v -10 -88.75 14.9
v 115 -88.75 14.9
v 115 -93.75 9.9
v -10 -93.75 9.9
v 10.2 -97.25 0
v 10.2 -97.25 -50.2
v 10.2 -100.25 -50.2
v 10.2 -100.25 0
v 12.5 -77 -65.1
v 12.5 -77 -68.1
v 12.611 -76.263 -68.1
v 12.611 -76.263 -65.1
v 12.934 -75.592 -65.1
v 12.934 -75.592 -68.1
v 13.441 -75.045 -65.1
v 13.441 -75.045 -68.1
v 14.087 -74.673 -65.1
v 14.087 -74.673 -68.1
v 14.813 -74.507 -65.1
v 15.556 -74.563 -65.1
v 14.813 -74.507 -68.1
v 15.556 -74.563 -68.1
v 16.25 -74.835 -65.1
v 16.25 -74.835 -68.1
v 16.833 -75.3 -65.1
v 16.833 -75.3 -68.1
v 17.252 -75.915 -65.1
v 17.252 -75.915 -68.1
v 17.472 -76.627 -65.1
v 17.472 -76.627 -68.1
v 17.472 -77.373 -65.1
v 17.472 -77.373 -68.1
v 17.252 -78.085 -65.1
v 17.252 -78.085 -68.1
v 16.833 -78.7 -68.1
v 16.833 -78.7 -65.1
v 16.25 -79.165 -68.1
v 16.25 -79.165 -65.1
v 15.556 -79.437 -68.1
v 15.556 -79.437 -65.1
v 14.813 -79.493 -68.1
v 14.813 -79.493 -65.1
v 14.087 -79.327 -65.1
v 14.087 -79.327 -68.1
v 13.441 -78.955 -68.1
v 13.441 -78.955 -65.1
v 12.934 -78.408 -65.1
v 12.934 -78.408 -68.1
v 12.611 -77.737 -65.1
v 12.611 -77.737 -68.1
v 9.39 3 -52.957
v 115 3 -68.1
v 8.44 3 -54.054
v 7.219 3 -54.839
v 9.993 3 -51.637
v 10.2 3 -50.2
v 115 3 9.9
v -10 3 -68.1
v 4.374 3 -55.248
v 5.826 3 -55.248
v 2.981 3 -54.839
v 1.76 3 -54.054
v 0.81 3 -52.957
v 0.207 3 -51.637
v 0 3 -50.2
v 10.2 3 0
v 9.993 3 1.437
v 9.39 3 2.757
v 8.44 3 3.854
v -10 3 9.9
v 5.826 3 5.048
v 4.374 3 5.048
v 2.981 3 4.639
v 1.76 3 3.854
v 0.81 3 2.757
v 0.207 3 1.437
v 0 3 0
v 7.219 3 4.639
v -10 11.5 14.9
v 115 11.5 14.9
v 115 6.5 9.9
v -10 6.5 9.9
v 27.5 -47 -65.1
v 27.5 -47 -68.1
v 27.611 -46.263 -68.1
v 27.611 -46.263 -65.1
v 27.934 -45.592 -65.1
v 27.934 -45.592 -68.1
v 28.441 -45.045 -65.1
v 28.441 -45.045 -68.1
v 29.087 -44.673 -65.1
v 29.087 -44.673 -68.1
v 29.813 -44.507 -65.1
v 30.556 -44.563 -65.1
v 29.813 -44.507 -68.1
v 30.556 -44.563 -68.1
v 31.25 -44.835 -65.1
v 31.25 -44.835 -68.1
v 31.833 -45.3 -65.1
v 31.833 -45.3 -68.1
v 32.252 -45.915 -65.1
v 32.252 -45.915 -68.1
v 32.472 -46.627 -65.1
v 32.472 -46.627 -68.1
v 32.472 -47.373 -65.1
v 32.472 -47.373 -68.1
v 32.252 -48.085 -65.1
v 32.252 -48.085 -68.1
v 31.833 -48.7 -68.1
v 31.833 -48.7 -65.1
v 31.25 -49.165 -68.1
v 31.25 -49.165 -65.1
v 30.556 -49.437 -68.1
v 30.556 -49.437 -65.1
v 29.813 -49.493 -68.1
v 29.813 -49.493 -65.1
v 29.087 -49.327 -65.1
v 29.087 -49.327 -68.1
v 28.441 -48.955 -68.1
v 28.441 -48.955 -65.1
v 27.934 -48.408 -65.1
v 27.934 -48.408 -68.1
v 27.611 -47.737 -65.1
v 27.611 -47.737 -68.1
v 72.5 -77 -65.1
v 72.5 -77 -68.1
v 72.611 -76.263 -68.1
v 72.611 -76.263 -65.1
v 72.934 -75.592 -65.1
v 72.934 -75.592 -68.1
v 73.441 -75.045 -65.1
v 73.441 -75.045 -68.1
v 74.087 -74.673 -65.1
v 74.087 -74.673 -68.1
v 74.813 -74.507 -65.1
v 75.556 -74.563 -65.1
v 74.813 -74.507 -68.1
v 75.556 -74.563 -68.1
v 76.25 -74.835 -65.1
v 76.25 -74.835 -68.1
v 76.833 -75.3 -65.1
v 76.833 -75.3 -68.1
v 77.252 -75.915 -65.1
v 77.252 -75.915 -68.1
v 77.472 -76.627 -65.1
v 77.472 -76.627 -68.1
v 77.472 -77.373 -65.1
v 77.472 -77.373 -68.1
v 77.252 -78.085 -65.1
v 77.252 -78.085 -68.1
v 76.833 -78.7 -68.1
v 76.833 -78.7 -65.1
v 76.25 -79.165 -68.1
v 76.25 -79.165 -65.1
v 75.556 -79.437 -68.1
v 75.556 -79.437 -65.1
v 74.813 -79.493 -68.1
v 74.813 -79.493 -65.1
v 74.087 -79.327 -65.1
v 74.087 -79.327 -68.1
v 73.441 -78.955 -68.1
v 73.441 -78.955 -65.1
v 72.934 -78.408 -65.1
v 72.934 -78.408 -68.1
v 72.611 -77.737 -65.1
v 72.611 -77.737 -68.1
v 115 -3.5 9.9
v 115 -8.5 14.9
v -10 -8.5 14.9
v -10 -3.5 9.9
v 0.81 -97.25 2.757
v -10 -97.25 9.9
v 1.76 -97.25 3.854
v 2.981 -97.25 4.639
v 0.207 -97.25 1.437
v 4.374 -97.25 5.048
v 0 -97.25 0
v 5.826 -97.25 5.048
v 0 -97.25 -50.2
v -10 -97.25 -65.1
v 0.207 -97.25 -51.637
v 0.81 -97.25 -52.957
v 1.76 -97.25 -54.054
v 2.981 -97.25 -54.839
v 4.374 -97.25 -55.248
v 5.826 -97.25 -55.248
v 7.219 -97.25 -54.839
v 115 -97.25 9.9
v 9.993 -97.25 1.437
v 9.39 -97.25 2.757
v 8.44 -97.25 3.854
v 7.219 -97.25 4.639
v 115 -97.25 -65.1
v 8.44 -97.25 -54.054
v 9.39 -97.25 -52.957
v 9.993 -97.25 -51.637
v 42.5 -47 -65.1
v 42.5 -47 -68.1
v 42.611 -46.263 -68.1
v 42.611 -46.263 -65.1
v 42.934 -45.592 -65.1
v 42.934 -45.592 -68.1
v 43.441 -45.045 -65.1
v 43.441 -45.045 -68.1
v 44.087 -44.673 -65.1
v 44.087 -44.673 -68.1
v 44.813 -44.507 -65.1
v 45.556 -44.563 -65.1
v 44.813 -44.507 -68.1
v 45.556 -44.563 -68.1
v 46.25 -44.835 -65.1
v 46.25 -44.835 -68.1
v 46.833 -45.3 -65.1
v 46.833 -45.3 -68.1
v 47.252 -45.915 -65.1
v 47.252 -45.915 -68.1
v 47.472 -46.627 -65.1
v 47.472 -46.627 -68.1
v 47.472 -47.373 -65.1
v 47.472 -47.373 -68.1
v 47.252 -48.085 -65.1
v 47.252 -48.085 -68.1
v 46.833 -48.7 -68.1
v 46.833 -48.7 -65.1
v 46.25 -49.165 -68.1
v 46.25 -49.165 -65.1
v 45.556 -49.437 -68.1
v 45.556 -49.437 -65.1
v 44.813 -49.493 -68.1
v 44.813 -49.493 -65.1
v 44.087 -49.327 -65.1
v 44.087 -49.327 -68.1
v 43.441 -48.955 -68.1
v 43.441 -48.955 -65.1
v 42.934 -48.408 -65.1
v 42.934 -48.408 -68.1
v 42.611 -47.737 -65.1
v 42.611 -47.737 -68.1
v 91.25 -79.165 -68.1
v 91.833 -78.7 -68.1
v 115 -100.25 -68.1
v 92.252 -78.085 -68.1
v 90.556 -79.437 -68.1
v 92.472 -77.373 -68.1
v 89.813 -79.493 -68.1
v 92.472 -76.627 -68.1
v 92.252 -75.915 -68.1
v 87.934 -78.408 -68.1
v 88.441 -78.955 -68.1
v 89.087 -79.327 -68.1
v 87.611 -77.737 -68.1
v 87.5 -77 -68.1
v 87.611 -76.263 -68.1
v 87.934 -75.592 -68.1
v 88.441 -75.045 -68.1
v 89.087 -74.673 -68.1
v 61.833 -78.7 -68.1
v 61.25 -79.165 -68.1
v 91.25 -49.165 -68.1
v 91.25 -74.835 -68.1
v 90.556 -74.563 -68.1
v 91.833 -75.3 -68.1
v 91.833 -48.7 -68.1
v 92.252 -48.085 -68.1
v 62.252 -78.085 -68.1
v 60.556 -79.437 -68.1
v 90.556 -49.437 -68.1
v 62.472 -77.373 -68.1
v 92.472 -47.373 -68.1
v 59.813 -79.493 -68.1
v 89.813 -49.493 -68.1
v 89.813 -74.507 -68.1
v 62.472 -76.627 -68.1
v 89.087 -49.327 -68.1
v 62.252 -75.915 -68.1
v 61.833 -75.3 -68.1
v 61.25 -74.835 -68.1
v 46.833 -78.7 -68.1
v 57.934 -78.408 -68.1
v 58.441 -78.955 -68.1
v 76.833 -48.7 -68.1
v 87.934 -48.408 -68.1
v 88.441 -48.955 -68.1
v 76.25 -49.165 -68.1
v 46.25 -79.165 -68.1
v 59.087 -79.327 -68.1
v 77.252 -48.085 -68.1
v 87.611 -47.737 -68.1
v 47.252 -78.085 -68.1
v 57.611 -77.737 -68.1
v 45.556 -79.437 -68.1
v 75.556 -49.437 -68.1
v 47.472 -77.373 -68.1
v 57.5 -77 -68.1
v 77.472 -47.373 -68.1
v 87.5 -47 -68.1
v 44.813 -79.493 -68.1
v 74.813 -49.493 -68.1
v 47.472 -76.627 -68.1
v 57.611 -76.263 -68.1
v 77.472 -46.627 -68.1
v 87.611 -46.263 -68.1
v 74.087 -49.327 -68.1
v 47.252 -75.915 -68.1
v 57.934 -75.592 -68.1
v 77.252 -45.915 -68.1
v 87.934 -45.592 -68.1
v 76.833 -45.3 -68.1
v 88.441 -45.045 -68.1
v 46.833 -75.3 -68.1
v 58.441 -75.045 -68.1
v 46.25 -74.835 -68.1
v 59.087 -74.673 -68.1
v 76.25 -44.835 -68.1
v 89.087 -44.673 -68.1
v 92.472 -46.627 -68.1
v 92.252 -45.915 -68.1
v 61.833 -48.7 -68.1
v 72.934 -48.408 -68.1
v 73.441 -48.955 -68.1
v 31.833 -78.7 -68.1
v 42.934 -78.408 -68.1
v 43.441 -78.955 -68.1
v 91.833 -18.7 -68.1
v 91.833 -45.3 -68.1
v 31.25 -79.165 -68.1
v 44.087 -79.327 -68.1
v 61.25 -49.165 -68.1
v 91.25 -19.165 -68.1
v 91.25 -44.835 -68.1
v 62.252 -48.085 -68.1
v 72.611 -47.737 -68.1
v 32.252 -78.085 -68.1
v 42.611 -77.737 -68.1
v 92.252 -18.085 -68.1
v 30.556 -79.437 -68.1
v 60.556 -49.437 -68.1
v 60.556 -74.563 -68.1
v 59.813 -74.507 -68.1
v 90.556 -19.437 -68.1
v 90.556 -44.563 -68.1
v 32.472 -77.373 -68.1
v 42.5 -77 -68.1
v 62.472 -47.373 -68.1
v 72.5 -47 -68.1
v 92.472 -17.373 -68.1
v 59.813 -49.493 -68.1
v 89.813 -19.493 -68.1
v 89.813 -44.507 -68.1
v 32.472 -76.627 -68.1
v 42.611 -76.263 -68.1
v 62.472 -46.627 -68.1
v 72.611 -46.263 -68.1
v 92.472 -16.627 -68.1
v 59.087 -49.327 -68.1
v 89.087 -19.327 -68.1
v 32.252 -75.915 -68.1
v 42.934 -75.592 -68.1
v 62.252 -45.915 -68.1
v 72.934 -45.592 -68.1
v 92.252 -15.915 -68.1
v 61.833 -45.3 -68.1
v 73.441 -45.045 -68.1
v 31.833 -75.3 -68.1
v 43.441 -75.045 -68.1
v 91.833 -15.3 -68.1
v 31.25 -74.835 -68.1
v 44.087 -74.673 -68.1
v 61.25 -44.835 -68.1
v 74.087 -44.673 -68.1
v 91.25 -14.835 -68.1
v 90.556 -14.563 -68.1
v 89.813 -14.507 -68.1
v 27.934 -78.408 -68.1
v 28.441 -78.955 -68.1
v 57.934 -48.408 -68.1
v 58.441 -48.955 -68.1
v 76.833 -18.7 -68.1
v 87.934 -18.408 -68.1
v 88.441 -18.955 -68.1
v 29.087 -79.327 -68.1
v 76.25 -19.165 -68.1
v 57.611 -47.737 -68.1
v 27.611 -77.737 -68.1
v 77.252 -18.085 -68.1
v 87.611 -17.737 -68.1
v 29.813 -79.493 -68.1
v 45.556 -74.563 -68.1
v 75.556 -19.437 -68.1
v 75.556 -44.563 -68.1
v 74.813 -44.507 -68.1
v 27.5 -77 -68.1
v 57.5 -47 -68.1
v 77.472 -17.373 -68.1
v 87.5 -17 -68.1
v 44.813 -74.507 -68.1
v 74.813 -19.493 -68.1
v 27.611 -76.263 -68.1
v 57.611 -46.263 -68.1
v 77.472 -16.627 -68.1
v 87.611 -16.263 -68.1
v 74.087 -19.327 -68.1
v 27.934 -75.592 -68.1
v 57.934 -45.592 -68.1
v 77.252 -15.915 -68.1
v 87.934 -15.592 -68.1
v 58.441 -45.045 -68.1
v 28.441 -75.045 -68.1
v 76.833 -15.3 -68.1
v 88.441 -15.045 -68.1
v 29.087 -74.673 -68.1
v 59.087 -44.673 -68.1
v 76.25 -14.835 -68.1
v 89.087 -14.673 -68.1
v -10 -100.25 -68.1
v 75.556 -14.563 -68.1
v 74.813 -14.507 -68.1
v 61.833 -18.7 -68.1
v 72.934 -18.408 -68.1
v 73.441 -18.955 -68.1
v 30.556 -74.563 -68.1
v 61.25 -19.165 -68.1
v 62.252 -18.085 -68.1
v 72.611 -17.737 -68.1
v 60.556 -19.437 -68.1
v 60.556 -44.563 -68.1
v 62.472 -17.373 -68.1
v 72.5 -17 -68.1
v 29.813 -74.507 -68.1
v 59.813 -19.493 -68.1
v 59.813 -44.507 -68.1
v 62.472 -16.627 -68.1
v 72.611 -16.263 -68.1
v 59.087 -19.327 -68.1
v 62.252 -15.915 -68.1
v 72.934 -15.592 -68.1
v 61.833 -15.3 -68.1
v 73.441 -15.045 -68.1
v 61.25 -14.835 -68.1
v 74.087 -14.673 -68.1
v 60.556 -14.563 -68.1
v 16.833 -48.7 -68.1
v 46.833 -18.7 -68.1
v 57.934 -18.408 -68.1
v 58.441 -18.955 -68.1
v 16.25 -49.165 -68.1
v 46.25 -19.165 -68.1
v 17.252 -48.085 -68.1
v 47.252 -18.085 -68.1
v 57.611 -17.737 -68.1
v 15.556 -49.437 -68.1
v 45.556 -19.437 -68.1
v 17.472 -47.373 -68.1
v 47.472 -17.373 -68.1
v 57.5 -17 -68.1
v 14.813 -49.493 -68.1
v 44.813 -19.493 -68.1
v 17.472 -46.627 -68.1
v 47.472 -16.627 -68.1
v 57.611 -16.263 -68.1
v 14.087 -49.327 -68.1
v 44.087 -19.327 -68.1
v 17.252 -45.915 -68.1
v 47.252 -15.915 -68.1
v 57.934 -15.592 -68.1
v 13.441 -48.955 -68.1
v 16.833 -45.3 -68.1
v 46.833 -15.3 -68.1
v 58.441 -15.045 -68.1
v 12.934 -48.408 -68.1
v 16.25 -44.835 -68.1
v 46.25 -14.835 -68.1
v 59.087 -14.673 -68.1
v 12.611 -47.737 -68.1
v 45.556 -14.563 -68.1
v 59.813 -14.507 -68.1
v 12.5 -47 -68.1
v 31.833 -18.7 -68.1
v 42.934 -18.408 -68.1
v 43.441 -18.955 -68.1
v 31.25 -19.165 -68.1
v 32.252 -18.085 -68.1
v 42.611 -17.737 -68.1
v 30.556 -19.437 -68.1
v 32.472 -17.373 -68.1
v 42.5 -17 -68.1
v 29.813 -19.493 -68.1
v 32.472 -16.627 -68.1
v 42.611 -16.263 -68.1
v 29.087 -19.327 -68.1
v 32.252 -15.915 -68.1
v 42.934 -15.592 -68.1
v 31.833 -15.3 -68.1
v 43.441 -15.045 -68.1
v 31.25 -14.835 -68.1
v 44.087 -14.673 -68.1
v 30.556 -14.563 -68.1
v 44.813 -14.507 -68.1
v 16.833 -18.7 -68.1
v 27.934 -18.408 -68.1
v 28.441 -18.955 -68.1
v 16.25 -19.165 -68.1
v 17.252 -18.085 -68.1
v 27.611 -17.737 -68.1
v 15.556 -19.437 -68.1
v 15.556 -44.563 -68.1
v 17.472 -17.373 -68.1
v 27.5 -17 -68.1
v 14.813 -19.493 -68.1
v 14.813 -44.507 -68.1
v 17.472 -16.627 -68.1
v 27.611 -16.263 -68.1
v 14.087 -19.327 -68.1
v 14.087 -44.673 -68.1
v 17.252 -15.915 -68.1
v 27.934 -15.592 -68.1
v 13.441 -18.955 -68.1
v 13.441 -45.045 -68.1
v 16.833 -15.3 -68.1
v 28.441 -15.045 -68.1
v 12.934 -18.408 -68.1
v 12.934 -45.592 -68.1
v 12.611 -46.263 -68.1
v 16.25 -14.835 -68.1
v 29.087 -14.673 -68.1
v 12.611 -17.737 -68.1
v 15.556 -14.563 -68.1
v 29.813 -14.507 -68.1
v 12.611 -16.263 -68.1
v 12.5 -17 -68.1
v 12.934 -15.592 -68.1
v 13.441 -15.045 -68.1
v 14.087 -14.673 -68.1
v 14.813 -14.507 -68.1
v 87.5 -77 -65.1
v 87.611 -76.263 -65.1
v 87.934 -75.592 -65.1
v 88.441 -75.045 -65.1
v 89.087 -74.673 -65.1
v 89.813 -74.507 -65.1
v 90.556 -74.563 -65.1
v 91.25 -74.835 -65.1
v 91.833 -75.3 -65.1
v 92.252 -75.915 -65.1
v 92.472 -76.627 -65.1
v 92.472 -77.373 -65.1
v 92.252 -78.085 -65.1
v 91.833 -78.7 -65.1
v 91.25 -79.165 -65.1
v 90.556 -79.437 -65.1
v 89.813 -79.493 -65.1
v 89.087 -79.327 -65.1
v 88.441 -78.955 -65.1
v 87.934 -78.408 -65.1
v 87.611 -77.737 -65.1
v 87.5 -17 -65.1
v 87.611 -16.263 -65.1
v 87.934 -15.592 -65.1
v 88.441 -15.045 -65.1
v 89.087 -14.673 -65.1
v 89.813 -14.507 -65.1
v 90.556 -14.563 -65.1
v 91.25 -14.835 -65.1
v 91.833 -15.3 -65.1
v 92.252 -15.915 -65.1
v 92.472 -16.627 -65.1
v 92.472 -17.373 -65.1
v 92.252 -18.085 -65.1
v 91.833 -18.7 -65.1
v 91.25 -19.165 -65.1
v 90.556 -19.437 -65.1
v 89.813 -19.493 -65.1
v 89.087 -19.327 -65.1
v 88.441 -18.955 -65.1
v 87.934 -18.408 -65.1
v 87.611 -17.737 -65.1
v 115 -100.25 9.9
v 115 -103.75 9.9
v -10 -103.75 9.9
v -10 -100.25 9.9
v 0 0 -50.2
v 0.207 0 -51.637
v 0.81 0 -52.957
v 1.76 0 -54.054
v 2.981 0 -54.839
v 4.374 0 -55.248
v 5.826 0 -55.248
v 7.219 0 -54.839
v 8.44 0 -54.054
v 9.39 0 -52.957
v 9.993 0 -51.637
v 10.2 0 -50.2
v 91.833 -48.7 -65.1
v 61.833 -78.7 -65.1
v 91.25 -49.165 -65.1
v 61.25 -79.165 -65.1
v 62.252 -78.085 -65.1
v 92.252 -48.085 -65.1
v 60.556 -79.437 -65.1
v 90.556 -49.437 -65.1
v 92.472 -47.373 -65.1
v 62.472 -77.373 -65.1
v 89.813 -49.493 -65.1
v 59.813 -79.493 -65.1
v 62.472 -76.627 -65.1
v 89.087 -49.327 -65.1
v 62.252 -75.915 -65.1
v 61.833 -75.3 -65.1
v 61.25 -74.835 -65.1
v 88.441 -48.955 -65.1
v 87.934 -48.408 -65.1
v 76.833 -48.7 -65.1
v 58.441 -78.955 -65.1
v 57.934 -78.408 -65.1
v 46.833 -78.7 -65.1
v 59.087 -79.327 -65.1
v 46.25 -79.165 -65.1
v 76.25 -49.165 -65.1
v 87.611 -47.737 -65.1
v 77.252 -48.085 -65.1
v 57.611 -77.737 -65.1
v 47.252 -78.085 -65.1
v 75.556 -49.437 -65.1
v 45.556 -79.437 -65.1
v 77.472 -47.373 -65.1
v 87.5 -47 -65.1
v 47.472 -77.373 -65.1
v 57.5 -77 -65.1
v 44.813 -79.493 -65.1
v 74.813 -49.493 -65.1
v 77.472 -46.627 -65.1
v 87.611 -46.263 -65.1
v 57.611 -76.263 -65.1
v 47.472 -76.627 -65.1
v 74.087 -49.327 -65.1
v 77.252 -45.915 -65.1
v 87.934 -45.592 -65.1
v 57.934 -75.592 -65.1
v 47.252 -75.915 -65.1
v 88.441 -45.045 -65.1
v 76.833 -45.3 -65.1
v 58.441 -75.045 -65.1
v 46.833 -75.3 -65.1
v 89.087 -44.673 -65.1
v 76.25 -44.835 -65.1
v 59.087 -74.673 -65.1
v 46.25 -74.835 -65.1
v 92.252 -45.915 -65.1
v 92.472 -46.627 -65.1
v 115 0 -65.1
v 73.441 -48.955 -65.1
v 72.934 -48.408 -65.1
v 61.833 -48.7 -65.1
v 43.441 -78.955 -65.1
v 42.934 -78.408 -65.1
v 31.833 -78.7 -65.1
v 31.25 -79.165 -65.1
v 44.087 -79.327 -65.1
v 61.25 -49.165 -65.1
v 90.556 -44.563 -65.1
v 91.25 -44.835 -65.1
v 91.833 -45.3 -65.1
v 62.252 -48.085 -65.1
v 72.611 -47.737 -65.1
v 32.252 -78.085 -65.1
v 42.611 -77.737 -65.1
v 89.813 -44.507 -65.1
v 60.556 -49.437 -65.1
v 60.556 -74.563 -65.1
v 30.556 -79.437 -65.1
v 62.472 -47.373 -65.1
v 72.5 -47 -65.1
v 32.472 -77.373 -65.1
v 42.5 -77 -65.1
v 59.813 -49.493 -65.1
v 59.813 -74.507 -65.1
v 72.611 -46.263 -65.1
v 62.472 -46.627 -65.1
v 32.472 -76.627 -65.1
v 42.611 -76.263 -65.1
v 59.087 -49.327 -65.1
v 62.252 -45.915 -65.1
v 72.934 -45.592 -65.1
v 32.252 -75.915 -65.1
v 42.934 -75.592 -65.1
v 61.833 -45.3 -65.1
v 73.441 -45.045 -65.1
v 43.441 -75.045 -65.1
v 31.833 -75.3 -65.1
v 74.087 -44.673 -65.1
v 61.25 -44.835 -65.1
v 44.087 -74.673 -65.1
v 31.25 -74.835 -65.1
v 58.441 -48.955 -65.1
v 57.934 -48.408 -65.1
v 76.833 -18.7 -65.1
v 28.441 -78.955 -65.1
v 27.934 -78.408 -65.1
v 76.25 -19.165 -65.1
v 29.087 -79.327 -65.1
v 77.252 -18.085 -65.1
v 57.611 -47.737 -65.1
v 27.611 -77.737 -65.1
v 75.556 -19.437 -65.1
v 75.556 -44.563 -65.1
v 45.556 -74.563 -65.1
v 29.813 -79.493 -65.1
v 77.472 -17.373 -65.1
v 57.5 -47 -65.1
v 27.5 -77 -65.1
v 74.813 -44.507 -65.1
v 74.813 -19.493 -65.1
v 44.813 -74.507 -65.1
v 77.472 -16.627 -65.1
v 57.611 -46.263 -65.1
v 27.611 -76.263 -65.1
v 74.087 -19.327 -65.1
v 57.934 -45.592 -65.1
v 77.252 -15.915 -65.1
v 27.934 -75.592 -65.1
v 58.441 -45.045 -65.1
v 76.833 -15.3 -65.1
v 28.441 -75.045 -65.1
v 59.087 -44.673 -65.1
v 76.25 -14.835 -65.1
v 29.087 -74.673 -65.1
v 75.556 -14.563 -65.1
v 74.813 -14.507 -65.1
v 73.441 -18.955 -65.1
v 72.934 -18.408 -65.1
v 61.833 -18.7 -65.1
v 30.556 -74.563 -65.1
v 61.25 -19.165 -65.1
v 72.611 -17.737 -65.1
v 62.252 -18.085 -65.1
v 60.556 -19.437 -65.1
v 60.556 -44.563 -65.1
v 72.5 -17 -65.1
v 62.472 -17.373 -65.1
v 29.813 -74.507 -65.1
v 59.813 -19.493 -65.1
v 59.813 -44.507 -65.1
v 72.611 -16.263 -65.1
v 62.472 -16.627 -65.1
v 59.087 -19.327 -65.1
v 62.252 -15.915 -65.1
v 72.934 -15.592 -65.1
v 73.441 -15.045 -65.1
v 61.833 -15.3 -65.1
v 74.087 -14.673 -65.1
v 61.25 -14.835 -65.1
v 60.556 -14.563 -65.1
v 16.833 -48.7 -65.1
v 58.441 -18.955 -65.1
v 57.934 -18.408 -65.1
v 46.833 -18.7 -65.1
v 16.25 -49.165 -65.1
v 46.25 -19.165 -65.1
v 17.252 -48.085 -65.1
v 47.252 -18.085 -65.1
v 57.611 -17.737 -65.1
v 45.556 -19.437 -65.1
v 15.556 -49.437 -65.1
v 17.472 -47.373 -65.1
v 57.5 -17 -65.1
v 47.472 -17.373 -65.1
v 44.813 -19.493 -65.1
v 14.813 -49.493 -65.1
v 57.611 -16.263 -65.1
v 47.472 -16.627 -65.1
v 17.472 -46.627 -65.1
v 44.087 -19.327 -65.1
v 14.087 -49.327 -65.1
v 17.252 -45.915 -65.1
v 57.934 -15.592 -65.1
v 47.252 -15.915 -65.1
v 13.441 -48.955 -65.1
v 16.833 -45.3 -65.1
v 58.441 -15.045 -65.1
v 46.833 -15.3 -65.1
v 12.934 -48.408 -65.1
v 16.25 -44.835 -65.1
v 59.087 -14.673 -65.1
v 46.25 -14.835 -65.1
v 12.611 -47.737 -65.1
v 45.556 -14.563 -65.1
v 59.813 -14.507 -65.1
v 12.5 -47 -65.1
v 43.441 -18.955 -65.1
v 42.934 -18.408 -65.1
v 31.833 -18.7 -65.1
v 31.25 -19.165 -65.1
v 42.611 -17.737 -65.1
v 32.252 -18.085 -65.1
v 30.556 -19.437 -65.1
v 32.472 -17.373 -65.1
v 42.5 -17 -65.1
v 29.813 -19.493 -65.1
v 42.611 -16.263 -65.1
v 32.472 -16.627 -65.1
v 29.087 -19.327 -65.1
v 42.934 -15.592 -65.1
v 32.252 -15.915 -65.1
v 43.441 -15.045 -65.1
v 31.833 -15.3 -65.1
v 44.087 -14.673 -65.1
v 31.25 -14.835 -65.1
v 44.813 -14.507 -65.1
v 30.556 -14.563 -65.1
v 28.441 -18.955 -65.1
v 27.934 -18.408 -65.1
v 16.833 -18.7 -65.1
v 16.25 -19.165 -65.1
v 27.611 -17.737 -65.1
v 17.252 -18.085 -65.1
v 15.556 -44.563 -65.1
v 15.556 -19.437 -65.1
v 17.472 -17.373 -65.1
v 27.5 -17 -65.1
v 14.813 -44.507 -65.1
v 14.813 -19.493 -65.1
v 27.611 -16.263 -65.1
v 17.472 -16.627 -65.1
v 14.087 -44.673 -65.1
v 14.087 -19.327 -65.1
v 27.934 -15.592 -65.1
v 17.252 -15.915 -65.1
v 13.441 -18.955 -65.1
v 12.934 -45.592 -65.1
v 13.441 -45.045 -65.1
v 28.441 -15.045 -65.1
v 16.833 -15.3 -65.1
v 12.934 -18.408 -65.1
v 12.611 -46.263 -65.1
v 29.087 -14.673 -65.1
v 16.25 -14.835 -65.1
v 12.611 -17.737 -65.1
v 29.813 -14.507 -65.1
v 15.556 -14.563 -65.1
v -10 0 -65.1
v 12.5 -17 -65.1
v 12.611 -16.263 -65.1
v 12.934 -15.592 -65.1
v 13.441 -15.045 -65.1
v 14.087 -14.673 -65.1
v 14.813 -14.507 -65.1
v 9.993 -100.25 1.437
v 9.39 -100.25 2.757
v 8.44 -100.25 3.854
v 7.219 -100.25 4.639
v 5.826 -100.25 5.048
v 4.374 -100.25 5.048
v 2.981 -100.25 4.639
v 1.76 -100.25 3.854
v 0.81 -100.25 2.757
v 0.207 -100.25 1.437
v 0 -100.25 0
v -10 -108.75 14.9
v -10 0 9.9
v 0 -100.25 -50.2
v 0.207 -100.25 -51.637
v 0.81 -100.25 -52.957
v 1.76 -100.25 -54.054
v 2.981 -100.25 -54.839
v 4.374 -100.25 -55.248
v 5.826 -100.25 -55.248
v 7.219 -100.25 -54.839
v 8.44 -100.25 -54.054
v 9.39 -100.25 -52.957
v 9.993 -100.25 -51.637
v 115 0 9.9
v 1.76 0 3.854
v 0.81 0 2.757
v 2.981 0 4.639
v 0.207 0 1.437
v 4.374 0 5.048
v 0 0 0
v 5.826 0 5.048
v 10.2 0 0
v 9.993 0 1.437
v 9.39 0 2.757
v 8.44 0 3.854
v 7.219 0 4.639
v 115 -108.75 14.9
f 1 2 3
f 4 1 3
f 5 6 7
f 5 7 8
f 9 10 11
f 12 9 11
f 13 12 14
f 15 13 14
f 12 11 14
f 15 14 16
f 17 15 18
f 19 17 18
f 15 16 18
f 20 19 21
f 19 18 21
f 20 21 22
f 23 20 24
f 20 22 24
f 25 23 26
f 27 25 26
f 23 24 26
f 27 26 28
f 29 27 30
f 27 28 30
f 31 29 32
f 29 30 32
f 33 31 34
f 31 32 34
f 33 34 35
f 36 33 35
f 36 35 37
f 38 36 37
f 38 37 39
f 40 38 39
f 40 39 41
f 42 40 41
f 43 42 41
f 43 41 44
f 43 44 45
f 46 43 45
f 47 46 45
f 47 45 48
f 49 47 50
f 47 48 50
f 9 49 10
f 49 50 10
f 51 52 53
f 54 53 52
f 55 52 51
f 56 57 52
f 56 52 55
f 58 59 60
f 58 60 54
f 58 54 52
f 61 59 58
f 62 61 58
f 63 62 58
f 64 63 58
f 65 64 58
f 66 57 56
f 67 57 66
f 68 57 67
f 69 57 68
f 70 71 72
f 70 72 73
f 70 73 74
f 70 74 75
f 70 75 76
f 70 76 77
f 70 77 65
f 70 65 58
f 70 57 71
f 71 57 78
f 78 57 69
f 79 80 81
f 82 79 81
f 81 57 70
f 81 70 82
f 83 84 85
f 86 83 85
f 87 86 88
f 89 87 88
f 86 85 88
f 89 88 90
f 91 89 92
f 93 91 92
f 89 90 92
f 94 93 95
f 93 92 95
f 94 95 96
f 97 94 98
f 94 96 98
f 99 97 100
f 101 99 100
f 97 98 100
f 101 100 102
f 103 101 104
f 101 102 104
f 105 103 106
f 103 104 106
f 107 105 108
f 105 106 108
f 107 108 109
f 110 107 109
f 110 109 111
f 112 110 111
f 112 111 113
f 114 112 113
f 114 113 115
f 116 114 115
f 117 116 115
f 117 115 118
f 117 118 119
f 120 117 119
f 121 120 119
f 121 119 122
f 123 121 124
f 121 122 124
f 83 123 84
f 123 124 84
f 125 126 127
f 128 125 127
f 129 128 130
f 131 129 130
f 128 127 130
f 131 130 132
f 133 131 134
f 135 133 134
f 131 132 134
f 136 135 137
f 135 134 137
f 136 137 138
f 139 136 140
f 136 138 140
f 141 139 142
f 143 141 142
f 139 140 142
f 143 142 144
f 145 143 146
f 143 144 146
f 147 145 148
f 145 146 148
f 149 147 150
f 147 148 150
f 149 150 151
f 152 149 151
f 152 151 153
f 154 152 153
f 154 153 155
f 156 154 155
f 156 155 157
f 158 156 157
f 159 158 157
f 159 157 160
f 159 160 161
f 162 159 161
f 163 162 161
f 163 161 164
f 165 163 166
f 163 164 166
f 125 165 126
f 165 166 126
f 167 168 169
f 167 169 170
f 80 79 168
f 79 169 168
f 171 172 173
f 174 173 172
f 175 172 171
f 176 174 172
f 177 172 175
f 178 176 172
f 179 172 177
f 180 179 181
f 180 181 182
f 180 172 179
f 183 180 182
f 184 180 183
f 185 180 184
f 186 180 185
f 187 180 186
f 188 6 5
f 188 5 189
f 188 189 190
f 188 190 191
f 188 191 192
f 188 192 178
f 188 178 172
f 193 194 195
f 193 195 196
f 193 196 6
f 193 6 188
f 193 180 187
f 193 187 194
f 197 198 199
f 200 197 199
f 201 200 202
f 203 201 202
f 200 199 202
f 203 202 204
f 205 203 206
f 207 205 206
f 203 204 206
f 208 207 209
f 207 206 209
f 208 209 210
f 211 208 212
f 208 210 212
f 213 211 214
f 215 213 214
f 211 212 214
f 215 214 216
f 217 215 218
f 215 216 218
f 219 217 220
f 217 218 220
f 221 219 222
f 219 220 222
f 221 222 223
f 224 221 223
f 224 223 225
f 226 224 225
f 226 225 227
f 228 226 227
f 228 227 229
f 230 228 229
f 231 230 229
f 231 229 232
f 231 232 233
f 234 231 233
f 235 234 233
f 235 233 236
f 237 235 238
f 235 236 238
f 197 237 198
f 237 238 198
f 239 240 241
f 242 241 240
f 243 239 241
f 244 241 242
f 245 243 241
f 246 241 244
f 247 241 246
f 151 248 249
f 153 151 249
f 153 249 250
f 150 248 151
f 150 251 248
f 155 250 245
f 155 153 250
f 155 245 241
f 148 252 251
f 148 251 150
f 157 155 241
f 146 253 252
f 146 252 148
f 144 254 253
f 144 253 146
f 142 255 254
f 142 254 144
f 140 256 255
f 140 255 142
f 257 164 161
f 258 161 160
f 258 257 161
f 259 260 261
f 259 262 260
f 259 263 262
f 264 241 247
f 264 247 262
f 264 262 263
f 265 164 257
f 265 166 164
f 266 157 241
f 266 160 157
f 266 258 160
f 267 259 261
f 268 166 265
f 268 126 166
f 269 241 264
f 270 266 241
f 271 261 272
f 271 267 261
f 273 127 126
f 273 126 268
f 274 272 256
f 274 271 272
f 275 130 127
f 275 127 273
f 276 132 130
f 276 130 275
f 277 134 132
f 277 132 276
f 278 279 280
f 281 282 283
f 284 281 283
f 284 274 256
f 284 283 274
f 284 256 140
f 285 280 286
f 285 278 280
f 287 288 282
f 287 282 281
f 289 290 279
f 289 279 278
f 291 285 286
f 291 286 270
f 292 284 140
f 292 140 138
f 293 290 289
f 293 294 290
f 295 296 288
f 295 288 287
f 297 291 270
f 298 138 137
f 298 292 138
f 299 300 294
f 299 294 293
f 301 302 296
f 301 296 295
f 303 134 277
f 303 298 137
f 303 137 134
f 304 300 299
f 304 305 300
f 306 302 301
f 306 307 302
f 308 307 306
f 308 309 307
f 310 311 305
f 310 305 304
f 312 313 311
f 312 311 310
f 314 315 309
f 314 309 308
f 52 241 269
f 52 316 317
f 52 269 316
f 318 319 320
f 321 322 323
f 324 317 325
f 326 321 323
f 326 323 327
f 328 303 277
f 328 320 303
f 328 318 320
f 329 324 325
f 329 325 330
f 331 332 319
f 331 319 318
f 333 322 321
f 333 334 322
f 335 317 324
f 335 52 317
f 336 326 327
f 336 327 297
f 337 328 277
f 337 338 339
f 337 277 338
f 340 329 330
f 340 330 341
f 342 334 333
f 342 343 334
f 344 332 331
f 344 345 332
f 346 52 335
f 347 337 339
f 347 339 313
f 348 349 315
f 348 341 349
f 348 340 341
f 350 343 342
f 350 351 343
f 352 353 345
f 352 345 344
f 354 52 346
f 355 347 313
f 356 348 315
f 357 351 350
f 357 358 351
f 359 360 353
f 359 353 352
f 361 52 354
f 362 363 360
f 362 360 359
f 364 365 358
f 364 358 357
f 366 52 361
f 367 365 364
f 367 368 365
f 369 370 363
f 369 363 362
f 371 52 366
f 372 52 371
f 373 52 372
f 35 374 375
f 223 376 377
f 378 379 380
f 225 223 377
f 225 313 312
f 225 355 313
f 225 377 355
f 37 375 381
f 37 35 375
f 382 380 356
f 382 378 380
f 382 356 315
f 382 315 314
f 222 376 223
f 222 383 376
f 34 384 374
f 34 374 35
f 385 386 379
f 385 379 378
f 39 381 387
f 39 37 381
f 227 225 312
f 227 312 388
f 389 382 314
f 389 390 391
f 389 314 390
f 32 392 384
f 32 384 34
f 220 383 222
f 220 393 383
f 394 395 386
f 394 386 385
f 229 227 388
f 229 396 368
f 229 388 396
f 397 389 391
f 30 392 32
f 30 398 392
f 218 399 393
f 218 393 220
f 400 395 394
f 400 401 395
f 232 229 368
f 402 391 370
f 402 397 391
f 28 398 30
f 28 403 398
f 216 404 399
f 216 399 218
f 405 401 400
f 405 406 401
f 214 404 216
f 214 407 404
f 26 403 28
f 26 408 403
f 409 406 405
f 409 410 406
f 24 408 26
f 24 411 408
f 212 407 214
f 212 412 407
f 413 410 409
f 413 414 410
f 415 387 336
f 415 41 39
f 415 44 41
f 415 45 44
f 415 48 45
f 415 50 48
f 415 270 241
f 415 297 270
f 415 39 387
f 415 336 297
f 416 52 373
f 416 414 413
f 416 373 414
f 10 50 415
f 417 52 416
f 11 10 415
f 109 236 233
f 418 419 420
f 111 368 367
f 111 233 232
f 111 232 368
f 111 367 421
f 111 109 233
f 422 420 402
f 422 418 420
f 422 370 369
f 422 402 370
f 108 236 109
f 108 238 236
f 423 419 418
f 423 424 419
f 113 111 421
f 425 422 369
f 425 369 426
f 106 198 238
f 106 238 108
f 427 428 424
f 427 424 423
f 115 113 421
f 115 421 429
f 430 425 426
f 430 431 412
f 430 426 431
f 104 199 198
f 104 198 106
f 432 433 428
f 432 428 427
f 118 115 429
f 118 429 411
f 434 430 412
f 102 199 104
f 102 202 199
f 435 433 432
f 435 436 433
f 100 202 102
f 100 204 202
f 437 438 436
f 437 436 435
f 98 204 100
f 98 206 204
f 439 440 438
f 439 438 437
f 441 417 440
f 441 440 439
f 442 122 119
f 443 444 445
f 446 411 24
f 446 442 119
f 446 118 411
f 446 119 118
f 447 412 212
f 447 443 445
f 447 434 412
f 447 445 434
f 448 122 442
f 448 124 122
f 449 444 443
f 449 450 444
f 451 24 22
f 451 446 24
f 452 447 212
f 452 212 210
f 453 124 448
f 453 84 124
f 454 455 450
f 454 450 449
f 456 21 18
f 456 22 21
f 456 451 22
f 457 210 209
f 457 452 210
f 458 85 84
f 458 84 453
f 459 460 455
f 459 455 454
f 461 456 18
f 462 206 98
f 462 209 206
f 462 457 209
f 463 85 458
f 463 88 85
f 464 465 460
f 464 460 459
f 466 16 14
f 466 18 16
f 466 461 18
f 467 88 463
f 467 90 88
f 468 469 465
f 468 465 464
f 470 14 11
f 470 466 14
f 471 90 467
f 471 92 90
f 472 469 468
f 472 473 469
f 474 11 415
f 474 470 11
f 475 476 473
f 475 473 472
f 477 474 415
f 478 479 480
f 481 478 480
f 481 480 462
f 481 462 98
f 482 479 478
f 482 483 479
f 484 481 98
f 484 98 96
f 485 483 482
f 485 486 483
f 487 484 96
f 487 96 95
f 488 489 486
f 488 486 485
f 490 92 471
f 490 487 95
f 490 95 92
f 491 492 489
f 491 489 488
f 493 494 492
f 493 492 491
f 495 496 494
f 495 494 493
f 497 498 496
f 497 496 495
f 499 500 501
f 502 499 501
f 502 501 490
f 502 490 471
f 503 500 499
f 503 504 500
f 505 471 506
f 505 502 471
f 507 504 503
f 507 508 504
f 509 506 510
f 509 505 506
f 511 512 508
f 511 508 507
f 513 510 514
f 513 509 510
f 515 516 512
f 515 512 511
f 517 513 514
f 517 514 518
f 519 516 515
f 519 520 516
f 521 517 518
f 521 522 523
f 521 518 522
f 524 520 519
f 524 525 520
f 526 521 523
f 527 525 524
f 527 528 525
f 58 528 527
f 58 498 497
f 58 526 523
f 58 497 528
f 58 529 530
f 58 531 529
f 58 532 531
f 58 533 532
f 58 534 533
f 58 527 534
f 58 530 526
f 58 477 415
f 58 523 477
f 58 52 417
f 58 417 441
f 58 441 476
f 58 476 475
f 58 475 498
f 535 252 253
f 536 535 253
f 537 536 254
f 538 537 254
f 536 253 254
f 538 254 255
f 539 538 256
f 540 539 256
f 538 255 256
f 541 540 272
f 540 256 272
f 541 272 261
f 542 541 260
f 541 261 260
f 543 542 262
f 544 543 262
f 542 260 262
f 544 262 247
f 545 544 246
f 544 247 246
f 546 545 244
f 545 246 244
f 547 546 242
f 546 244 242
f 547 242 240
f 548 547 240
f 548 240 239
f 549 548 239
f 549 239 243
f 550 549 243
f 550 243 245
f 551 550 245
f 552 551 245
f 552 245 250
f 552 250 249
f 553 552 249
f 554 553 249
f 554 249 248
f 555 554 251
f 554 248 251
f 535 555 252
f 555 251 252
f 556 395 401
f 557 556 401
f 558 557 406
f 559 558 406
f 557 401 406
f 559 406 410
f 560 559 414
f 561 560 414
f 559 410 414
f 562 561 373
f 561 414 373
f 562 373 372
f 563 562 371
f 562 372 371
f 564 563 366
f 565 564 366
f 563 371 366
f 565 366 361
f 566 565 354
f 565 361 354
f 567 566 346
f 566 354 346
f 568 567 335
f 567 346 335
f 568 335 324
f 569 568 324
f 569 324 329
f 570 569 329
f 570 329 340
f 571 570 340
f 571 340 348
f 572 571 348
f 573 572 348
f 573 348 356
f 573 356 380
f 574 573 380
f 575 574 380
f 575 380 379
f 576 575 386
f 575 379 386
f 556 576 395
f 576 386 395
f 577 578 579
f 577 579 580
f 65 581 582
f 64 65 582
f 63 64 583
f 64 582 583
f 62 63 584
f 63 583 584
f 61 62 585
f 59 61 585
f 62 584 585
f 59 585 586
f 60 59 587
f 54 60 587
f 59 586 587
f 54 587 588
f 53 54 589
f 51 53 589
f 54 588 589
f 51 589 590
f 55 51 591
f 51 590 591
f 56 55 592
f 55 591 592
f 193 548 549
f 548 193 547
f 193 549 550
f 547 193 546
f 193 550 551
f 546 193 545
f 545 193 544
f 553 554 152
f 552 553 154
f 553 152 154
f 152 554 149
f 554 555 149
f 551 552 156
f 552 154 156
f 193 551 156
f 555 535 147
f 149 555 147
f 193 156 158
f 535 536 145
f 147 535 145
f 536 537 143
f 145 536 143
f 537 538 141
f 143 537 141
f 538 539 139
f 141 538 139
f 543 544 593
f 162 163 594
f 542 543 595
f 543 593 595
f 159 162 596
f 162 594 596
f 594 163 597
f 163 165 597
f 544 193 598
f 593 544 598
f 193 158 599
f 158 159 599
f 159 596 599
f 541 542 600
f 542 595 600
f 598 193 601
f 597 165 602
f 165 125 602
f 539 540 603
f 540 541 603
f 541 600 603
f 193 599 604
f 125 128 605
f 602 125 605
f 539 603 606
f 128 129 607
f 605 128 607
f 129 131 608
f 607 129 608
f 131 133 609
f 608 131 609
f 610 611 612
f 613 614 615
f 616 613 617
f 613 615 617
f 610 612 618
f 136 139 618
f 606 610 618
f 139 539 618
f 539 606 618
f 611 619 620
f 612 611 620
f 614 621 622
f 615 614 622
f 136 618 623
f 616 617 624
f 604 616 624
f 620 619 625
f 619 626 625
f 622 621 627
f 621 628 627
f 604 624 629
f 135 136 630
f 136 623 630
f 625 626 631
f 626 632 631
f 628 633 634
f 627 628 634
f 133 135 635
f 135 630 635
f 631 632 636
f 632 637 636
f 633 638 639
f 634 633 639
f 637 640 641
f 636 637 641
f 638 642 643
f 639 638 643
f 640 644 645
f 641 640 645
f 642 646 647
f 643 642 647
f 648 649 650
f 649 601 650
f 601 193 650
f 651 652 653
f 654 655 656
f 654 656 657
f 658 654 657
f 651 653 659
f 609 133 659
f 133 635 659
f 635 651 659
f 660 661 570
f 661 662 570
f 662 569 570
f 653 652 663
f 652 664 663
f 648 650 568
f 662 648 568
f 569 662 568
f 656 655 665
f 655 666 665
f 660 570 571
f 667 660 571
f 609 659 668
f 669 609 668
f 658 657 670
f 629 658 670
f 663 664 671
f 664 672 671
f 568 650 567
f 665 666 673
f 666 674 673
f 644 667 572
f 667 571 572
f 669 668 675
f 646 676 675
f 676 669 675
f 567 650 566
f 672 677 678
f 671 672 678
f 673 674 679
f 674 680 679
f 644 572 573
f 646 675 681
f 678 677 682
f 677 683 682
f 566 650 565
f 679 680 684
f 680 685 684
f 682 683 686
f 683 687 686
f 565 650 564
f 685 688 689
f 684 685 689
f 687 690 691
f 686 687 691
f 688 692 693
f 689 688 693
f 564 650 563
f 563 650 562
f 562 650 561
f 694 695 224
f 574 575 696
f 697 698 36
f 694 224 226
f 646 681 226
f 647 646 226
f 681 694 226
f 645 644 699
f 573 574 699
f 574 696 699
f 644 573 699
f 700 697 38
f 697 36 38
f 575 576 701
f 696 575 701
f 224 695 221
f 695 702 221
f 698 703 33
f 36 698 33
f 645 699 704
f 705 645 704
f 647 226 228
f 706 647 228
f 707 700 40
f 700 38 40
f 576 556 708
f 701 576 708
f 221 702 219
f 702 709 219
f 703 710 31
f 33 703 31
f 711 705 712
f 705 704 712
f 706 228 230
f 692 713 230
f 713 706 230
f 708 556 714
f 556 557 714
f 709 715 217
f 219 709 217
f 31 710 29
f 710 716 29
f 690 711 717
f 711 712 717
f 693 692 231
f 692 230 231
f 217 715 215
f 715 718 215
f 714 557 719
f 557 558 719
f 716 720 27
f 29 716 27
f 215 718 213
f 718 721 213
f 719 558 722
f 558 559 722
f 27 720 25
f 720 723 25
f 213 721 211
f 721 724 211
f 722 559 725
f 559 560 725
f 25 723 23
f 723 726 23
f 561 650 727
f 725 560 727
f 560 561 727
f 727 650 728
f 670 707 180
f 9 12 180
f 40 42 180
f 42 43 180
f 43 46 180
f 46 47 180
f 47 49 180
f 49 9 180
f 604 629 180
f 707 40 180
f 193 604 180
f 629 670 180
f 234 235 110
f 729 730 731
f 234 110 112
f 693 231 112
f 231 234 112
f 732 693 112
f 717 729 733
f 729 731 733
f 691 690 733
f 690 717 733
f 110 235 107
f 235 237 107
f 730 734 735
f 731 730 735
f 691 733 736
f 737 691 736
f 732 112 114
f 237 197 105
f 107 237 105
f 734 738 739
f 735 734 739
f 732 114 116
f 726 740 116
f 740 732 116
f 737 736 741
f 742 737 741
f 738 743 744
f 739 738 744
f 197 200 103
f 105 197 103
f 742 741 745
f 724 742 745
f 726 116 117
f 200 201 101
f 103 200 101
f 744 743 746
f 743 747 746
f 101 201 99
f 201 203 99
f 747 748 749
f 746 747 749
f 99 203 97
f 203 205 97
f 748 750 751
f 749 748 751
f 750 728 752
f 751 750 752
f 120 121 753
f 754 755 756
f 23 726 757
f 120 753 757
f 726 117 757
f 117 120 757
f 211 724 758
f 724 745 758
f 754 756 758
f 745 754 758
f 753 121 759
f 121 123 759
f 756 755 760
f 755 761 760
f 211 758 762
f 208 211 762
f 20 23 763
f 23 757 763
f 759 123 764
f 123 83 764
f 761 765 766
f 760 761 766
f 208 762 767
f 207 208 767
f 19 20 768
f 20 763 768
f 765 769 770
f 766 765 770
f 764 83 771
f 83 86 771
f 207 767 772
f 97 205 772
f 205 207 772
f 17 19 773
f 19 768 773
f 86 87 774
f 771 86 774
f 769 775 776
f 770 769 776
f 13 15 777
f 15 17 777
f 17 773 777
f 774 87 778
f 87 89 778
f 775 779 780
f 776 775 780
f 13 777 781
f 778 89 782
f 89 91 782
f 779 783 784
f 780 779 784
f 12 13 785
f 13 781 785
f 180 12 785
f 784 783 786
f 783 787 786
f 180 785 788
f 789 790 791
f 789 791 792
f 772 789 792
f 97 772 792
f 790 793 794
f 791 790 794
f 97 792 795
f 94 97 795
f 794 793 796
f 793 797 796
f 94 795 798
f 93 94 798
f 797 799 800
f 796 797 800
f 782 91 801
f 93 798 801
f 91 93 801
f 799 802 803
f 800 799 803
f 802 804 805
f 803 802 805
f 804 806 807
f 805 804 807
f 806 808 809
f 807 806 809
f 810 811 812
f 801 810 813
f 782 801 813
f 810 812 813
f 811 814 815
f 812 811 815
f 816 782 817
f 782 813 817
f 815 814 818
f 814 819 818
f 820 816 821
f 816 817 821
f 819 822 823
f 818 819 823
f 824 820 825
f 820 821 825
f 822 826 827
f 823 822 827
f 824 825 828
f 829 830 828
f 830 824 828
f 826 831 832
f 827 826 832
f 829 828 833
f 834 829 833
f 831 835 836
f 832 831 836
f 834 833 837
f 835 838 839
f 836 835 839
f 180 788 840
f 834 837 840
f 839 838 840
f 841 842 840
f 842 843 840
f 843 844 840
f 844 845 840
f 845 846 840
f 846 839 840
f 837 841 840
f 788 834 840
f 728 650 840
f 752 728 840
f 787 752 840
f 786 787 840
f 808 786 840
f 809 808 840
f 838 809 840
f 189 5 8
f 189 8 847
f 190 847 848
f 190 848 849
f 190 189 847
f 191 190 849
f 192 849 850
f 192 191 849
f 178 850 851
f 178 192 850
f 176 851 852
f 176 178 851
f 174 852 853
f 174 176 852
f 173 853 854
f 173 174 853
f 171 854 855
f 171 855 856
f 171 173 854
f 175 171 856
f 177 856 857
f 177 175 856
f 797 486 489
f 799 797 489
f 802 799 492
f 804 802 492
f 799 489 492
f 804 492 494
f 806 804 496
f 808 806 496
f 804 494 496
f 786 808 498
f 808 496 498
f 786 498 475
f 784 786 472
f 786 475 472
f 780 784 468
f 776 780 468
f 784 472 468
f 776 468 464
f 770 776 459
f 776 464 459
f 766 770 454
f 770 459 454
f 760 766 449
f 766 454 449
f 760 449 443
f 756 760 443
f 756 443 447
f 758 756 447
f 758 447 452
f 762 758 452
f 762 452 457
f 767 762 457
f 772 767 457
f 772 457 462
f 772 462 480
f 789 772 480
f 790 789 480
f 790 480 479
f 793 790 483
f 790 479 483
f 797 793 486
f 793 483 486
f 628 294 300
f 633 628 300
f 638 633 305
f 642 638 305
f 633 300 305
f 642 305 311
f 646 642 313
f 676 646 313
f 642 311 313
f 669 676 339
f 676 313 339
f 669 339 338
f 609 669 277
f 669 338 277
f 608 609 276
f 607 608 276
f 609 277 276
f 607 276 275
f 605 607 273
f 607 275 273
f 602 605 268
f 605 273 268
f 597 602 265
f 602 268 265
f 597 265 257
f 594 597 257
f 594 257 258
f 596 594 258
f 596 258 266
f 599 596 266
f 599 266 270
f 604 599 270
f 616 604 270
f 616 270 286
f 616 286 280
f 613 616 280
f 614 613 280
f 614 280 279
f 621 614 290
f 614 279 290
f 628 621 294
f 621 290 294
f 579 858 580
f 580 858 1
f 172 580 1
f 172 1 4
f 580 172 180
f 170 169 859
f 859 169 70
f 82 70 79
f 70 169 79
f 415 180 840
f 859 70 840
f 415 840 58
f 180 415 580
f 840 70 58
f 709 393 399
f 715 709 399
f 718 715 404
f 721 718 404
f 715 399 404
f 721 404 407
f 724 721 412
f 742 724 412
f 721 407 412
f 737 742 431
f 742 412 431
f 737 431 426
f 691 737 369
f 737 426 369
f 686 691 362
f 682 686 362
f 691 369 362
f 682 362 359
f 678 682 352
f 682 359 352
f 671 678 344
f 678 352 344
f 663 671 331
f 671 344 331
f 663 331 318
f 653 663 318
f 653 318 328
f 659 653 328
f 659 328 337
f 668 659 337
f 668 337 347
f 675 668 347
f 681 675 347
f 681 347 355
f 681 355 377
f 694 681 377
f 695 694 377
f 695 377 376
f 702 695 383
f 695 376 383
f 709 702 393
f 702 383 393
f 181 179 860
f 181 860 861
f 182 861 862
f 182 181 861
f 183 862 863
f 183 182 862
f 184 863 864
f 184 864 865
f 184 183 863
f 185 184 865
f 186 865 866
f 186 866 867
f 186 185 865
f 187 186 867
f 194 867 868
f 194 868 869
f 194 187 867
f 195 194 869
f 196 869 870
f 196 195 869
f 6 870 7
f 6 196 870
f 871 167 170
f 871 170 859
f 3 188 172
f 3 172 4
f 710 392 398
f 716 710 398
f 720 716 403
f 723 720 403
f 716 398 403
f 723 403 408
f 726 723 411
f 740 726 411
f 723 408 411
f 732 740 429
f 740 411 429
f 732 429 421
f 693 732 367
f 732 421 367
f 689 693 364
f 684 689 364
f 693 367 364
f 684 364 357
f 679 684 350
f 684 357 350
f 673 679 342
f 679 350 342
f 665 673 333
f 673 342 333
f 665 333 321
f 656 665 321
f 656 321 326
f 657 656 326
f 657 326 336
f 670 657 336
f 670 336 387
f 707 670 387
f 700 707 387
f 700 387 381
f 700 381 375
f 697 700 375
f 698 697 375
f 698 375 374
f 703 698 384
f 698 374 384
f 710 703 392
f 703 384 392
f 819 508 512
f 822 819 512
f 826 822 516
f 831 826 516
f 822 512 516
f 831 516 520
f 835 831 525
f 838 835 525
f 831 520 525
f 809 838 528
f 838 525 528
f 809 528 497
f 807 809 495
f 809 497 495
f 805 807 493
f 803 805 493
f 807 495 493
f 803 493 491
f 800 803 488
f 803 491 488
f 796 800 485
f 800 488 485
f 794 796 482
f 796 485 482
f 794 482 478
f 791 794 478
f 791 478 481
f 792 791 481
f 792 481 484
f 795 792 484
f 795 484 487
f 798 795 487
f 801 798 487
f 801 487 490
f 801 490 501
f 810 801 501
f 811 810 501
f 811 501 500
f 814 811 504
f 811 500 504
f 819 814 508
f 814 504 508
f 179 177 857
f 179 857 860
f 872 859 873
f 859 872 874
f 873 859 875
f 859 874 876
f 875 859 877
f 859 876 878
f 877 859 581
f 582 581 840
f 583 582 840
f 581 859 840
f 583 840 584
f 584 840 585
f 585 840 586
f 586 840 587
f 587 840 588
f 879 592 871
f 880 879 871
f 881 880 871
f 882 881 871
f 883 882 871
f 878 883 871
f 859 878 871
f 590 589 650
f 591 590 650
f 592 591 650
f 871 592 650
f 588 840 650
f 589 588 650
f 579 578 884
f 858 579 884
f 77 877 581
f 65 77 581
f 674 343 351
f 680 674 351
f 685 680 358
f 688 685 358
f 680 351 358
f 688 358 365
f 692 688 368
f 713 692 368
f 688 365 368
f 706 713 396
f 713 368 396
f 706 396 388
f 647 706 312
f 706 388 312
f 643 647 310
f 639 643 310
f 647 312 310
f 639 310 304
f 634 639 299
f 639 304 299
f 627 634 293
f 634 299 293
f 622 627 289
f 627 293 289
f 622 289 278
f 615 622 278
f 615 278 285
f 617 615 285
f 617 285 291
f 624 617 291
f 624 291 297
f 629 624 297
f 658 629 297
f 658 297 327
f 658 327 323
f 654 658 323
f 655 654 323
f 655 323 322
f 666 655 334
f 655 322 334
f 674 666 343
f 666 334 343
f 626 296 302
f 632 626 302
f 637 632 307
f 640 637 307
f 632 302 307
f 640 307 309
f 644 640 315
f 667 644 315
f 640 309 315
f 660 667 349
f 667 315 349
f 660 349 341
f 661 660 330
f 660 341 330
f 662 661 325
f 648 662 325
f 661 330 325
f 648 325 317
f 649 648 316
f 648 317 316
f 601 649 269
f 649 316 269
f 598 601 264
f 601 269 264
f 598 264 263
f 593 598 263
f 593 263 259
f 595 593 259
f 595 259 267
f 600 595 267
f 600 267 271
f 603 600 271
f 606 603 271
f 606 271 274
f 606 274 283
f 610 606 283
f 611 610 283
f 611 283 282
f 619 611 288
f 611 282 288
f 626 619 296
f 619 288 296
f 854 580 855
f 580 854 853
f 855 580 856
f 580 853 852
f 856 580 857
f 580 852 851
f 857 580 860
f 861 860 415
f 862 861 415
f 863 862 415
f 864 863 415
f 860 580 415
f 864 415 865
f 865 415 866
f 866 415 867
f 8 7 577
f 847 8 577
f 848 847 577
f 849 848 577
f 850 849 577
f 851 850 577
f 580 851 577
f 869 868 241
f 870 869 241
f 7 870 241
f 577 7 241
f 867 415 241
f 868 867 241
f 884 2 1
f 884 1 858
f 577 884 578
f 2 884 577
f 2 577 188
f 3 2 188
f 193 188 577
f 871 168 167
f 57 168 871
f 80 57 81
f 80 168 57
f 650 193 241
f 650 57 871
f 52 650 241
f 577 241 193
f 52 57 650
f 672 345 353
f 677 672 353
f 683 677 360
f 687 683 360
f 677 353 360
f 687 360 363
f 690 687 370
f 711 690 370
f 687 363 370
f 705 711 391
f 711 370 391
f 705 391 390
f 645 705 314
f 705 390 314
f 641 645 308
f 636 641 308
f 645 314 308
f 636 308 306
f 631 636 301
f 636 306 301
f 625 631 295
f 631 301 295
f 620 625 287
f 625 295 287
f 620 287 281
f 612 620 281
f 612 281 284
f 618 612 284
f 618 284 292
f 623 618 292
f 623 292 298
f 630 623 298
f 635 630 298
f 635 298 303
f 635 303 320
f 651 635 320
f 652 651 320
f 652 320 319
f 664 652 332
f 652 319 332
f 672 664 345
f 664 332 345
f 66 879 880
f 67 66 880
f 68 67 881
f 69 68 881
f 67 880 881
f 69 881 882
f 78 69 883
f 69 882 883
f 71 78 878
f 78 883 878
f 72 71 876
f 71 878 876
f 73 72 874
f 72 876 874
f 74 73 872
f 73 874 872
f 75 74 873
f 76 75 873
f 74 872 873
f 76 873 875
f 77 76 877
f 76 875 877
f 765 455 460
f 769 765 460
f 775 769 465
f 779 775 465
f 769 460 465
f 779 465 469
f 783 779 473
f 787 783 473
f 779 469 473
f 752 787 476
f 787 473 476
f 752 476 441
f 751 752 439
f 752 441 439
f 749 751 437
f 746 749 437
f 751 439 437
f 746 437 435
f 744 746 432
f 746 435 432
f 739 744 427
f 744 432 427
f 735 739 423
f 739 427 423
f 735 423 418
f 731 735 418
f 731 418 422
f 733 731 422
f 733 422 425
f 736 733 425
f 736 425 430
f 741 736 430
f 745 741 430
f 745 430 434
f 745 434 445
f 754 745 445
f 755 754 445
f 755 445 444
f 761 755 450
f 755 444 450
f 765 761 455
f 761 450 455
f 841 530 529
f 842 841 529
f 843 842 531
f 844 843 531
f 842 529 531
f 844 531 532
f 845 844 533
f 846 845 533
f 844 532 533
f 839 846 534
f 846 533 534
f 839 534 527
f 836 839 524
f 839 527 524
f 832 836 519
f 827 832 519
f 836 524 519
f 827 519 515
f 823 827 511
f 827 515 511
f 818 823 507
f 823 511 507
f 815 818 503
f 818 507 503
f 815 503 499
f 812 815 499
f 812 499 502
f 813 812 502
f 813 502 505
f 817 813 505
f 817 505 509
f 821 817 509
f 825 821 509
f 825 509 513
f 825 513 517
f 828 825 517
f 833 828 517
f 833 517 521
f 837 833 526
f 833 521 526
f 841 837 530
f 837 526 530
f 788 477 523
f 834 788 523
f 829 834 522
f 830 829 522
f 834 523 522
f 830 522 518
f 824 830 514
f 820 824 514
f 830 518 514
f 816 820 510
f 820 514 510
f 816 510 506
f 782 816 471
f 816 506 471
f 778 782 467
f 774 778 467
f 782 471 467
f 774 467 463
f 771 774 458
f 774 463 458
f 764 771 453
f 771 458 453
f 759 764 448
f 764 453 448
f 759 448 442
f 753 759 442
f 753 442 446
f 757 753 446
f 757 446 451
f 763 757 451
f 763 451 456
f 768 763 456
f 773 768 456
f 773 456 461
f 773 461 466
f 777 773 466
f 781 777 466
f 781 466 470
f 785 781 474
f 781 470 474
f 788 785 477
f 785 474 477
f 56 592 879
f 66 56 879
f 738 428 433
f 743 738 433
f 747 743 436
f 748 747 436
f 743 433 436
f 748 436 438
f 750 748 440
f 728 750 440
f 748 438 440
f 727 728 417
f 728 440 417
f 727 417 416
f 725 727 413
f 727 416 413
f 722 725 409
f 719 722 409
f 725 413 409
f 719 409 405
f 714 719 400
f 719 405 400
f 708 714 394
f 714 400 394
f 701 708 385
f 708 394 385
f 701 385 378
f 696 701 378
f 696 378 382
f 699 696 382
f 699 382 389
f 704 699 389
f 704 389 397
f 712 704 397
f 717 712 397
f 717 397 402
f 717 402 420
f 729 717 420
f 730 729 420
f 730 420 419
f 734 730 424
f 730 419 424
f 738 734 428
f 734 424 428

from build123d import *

# Parameters (mm, degrees)
ESQUISSE1_W             = 125
ESQUISSE1_H             = 80
BOSS_EXTRU_1_DEPTH      = 3
ESQUISSE2_W             = 125
ESQUISSE2_H             = 103.25
BOSS_EXTRU_2_DEPTH      = 3
ESQUISSE6_W             = 5
ESQUISSE6_H             = 3.5
BOSS_EXTRU_5_DEPTH      = 125
ESQUISSE7_R             = 2.5
ENL_V_MAT_EXTRU_2_DEPTH = 3


with BuildPart() as part:
    # Esquisse1 → Boss.-Extru.1 (new body)
    with BuildSketch(Plane(origin=(0, 0, 0), x_dir=(1, 0, 0), z_dir=(0, 1, 0))):
        with Locations((52.5, 25.1)):
            Rectangle(ESQUISSE1_W, ESQUISSE1_H)
        with BuildLine():
            ThreePointArc((10.2, 0), (5.1, -5.1), (0, 0))
            Line((0, 0), (0, 50.2))
            ThreePointArc((0, 50.2), (5.1, 55.3), (10.2, 50.2))
            Line((10.2, 50.2), (10.2, 0))
        make_face(mode=Mode.SUBTRACT)
    boss_extru_1 = extrude(amount=BOSS_EXTRU_1_DEPTH)

    # Esquisse2 → Boss.-Extru.2 (add)
    with BuildSketch(Plane(origin=(0, 0, -65.1), x_dir=(-1, 0, 0), z_dir=(0, 0, -1))):
        with Locations((-52.5, -48.625)):
            Rectangle(ESQUISSE2_W, ESQUISSE2_H)
    extrude(amount=BOSS_EXTRU_2_DEPTH)

    # Symétrie1: Boss.-Extru.1 across plane
    add(boss_extru_1.mirror(Plane(origin=(0, -48.625, 0), x_dir=(0, 0, 1), z_dir=(0, -1, 0))))

    # Esquisse6 → Boss.-Extru.5 (add)
    with BuildSketch(Plane(origin=(115, 0, 0), x_dir=(0, 0, -1), z_dir=(1, 0, 0))):
        with Locations((-12.4, -95.5)):
            Rectangle(ESQUISSE6_W, ESQUISSE6_H)
        with Locations((-12.4, -102)):
            Rectangle(ESQUISSE6_W, ESQUISSE6_H)
        Polygon((-14.9, -103.75), (-9.9, -103.75), (-14.9, -108.75), align=None)
        Polygon((-14.9, -93.75), (-14.9, -88.75), (-9.9, -93.75), align=None)
        Polygon((-14.9, -3.5), (-14.9, -8.5), (-9.9, -3.5), align=None)
        with Locations((-12.4, -1.75)):
            Rectangle(ESQUISSE6_W, ESQUISSE6_H)
        with Locations((-12.4, 4.75)):
            Rectangle(ESQUISSE6_W, ESQUISSE6_H)
        Polygon((-14.9, 11.5), (-9.9, 6.5), (-14.9, 6.5), align=None)
    extrude(amount=-BOSS_EXTRU_5_DEPTH)

    # Esquisse7 → Enlèv. mat.-Extru.2 (cut)
    with BuildSketch(Plane(origin=(0, 0, -68.1), x_dir=(-1, 0, 0), z_dir=(0, 0, -1))):
        with Locations((-90, -17)):
            Circle(ESQUISSE7_R)
        with Locations((-75, -17)):
            Circle(ESQUISSE7_R)
        with Locations((-60, -17)):
            Circle(ESQUISSE7_R)
        with Locations((-45, -17)):
            Circle(ESQUISSE7_R)
        with Locations((-30, -17)):
            Circle(ESQUISSE7_R)
        with Locations((-15, -17)):
            Circle(ESQUISSE7_R)
        with Locations((-75, -47)):
            Circle(ESQUISSE7_R)
        with Locations((-60, -47)):
            Circle(ESQUISSE7_R)
        with Locations((-45, -47)):
            Circle(ESQUISSE7_R)
        with Locations((-30, -47)):
            Circle(ESQUISSE7_R)
        with Locations((-15, -47)):
            Circle(ESQUISSE7_R)
        with Locations((-75, -77)):
            Circle(ESQUISSE7_R)
        with Locations((-60, -77)):
            Circle(ESQUISSE7_R)
        with Locations((-45, -77)):
            Circle(ESQUISSE7_R)
        with Locations((-30, -77)):
            Circle(ESQUISSE7_R)
        with Locations((-15, -77)):
            Circle(ESQUISSE7_R)
        with Locations((-90, -47)):
            Circle(ESQUISSE7_R)
        with Locations((-90, -77)):
            Circle(ESQUISSE7_R)
    extrude(amount=-ENL_V_MAT_EXTRU_2_DEPTH, mode=Mode.SUBTRACT)


solid = part.part
